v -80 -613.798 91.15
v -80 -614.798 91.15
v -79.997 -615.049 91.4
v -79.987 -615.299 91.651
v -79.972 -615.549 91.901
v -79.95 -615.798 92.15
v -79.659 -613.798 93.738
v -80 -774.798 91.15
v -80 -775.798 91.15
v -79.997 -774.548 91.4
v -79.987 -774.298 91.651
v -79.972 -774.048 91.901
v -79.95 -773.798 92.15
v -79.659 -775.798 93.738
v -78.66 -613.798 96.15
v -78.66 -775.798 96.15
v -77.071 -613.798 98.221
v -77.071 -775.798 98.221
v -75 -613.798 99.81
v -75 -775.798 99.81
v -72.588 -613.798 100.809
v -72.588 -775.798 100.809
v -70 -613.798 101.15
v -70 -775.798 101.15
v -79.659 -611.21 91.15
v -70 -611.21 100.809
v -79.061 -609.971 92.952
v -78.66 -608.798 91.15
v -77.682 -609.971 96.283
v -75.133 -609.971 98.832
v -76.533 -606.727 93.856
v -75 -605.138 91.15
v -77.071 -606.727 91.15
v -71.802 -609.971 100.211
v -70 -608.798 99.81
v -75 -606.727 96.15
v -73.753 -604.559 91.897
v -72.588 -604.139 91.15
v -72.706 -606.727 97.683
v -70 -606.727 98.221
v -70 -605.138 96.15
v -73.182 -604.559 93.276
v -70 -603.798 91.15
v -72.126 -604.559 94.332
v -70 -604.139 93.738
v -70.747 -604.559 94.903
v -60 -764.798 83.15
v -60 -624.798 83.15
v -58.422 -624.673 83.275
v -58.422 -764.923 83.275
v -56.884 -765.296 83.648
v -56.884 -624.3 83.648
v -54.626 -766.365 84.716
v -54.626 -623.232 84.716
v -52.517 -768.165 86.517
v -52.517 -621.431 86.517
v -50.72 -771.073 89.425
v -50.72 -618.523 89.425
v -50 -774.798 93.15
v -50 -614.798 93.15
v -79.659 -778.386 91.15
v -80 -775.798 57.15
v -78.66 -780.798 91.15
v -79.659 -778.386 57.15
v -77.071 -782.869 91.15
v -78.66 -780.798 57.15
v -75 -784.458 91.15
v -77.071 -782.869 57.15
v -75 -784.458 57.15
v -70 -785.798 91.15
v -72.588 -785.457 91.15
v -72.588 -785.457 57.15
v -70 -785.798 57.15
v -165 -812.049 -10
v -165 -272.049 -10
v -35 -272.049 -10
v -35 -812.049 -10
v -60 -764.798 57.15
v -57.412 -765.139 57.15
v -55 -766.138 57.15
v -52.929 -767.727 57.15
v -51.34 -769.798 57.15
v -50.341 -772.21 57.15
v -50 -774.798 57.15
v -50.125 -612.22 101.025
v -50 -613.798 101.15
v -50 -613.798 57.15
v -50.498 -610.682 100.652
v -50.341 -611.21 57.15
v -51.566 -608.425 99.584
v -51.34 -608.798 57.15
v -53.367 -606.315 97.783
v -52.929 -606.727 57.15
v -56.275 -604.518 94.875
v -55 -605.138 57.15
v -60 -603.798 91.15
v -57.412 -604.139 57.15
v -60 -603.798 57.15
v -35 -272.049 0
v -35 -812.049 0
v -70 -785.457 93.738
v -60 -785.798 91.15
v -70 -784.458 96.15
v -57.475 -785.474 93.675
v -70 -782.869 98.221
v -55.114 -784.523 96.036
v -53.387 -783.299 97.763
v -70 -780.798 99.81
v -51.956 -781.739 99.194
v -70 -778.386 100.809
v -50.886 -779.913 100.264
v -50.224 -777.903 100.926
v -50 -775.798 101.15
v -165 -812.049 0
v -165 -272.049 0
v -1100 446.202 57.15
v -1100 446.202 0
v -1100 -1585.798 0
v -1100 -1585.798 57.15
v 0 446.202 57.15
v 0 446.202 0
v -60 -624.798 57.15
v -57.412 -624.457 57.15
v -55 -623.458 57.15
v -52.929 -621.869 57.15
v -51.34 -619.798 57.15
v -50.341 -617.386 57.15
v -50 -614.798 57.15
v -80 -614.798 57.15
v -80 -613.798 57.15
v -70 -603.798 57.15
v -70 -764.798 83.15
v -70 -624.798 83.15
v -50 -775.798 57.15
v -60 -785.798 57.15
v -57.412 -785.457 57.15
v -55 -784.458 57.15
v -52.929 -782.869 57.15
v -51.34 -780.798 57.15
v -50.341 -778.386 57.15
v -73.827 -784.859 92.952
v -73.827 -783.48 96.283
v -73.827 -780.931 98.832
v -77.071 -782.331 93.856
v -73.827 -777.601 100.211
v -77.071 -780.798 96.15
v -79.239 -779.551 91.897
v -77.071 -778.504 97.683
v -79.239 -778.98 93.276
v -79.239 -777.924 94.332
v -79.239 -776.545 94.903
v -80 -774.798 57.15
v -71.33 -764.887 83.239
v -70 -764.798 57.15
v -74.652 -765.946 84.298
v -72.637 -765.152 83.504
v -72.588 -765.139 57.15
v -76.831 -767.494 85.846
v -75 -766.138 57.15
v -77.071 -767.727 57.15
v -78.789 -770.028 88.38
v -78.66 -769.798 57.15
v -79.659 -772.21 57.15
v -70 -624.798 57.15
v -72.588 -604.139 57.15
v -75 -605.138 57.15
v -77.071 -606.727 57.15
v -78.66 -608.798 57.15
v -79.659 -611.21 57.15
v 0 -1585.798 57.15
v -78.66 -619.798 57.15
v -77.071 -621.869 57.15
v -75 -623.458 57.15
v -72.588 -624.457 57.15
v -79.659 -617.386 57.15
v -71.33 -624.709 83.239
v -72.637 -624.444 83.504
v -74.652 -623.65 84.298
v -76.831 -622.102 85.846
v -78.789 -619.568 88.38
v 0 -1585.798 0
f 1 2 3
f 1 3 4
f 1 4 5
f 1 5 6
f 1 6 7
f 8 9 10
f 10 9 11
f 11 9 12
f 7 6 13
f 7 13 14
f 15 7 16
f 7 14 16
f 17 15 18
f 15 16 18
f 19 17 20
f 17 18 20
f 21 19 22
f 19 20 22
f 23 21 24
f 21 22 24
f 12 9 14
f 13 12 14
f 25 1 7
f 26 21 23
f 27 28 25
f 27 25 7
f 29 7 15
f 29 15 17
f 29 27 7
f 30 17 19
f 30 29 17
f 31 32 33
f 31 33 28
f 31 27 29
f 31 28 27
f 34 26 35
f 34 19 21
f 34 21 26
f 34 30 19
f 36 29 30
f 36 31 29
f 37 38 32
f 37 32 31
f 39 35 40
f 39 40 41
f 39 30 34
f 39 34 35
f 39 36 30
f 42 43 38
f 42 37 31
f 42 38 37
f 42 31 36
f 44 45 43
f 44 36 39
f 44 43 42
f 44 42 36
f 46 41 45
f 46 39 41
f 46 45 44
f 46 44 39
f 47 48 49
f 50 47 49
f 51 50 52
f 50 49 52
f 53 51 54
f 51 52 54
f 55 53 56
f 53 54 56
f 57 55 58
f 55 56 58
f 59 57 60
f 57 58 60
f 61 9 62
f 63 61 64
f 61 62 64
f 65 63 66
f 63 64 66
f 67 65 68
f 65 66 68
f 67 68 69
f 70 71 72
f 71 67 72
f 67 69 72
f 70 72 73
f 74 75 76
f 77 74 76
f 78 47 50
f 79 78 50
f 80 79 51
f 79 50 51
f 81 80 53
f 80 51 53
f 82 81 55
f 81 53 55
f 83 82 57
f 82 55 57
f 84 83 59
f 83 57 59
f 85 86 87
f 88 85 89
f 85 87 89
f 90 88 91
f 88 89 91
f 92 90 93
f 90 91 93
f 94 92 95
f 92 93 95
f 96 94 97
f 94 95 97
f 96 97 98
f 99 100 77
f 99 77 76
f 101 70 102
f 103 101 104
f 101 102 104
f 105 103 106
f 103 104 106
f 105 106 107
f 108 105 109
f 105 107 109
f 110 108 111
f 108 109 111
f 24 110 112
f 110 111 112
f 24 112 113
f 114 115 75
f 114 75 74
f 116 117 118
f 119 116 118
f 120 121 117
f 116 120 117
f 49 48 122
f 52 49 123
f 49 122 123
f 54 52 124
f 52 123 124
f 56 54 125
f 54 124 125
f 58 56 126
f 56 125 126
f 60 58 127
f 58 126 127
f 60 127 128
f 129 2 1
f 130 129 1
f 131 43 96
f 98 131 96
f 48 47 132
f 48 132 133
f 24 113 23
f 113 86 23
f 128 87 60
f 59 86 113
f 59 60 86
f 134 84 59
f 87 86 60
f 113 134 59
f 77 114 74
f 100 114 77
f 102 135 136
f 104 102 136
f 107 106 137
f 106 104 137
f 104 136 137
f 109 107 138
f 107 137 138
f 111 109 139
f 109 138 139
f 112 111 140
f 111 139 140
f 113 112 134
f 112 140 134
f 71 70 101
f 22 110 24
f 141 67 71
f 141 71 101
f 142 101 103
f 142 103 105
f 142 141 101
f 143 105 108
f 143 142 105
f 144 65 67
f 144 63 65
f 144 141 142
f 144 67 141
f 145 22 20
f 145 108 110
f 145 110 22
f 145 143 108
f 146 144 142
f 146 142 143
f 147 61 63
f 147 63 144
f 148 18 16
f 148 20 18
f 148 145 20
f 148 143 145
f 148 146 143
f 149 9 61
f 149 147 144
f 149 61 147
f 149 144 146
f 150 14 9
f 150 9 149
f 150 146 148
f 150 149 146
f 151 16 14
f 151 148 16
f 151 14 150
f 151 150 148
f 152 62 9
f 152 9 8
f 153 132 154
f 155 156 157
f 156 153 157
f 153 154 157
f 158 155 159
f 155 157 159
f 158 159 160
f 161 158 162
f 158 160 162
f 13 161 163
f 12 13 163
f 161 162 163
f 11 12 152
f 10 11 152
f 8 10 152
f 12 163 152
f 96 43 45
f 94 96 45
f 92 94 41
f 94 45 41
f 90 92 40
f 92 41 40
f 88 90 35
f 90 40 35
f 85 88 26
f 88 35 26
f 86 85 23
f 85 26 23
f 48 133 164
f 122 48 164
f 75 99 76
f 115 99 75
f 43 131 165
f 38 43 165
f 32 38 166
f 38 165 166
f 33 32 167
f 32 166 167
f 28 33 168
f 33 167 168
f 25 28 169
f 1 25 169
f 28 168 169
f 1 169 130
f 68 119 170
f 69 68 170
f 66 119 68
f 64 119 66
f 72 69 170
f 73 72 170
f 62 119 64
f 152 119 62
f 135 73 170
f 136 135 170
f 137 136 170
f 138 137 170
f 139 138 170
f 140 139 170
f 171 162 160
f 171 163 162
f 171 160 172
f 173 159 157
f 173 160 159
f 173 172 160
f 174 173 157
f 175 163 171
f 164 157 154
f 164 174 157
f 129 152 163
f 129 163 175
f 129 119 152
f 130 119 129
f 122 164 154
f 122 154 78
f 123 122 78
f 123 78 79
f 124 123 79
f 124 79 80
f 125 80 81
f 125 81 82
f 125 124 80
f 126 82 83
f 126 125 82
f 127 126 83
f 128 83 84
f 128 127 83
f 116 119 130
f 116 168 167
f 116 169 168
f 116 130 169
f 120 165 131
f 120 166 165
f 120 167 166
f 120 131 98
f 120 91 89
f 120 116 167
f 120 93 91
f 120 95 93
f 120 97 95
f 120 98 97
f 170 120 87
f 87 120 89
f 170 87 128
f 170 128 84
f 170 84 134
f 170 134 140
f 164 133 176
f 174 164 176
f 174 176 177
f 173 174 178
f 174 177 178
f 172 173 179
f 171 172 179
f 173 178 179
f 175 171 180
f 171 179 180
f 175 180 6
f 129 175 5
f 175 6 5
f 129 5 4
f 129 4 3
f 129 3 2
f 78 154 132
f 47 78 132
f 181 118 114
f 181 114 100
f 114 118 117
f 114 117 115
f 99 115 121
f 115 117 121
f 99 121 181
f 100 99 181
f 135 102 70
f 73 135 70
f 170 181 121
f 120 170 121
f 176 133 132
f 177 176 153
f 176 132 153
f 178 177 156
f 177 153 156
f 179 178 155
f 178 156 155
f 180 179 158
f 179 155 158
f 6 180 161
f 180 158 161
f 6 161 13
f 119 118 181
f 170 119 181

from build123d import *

# Parameters (mm, degrees)
BOSS_EXTRUDE2_DEPTH = 57.15
BOSS_EXTRUDE3_DEPTH = 44
CUT_EXTRUDE1_DEPTH  = 44
FILLET1_R           = 10
BOSS_EXTRUDE4_DEPTH = 10


with BuildPart() as part:
    # Sketch1 → Boss-Extrude2 (new body)
    with BuildSketch(Plane.XY):
        Polygon((0, 0), (0, 446.2018372120283), (-1100, 446.2018372120282), (-1100, -1585.7981627879717), (0, -1585.7981627879717), align=None)
    extrude(amount=BOSS_EXTRUDE2_DEPTH)

    # Sketch4 → Boss-Extrude3 (add)
    with BuildSketch(Plane.XY.offset(57.15)):
        Polygon((-79.99999999999993, -603.7981627879718), (-49.999999999999936, -603.7981627879718), (-49.999999999999915, -785.7981627879718), (-79.9999999999999, -785.7981627879718), align=None)
    extrude(amount=BOSS_EXTRUDE3_DEPTH)

    # Sketch5 → Cut-Extrude1 (cut)
    with BuildSketch(Plane.ZY.offset(80.00000000000003)):
        Polygon((83.14999999999999, -624.7981627879717), (57.150000000000006, -624.7981627879717), (57.15, -764.7981627879717), (83.15, -764.7981627879717), align=None)
    extrude(amount=-CUT_EXTRUDE1_DEPTH, mode=Mode.SUBTRACT)

    # Fillet1
    # the kernel refuses this fillet: 10 mm, written as the material it takes off along each edge
    with BuildSketch(Plane(origin=(-69.99999999999993, -613.7981627879718, 91.15), x_dir=(-1, -1.6e-16, 0), z_dir=(0, 1, 0))) as fillet1_piece_1_section:
        Polygon((0, 0), (FILLET1_R, 0), (FILLET1_R, FILLET1_R), (0, FILLET1_R), align=None)
    fillet1_piece_1 = extrude(amount=FILLET1_R, mode=Mode.PRIVATE)
    fillet1_piece_1 = fillet1_piece_1 - Plane(origin=(-69.99999999999993, -613.7981627879718, 91.15), x_dir=(0.7071067811865475, 0, -0.7071067811865475), z_dir=(0, 1, 0)) * Sphere(FILLET1_R, mode=Mode.PRIVATE)
    add(fillet1_piece_1, mode=Mode.SUBTRACT)
    with BuildSketch(Plane(origin=(-69.9999999999999, -775.7981627879718, 91.15), x_dir=(0, 0, 1), z_dir=(-1, -1.6e-16, 0))) as fillet1_piece_2_section:
        Polygon((0, 0), (FILLET1_R, 0), (FILLET1_R, -FILLET1_R), (0, -FILLET1_R), align=None)
    fillet1_piece_2 = extrude(amount=FILLET1_R, mode=Mode.PRIVATE)
    fillet1_piece_2 = fillet1_piece_2 - Plane(origin=(-69.9999999999999, -775.7981627879718, 91.15), x_dir=(0, 0.7071067811865475, -0.7071067811865475), z_dir=(-1, -1.6e-16, 0)) * Sphere(FILLET1_R, mode=Mode.PRIVATE)
    add(fillet1_piece_2, mode=Mode.SUBTRACT)
    with BuildSketch(Plane(origin=(-49.999999999999915, -785.7981627879718, 57.15), x_dir=(-1, 0, 0), z_dir=(0, 0, 1))) as fillet1_piece_3:
        with BuildLine():
            CenterArc((FILLET1_R, -FILLET1_R), FILLET1_R, 90, 90)
            Line((0, -FILLET1_R), (0, 0))
            Line((0, 0), (FILLET1_R, 0))
        make_face()
    extrude(amount=69, mode=Mode.SUBTRACT)
    with BuildSketch(Plane(origin=(-49.999999999999936, -603.7981627879718, 57.15), x_dir=(0, -1, 0), z_dir=(0, 0, 1))) as fillet1_piece_4:
        with BuildLine():
            CenterArc((FILLET1_R, -FILLET1_R), FILLET1_R, 90, 90)
            Line((0, -FILLET1_R), (0, 0))
            Line((0, 0), (FILLET1_R, 0))
        make_face()
    extrude(amount=69, mode=Mode.SUBTRACT)
    with BuildSketch(Plane(origin=(-79.99999999999993, -603.7981627879718, 57.15), x_dir=(1, 0, 0), z_dir=(0, 0, 1))) as fillet1_piece_5:
        with BuildLine():
            CenterArc((FILLET1_R, -FILLET1_R), FILLET1_R, 90, 90)
            Line((0, -FILLET1_R), (0, 0))
            Line((0, 0), (FILLET1_R, 0))
        make_face()
    extrude(amount=34.00000000000001, mode=Mode.SUBTRACT)
    with BuildSketch(Plane(origin=(-79.9999999999999, -785.7981627879718, 57.15), x_dir=(1, 0, 0), z_dir=(0, 0, 1))) as fillet1_piece_6:
        with BuildLine():
            CenterArc((FILLET1_R, FILLET1_R), FILLET1_R, 180, 90)
            Line((0, FILLET1_R), (0, 0))
            Line((0, 0), (FILLET1_R, 0))
        make_face()
    extrude(amount=34.00000000000001, mode=Mode.SUBTRACT)
    with BuildSketch(Plane(origin=(-69.99999999999993, -603.7981627879718, 101.15), x_dir=(0, 0, -1), z_dir=(1, 0, 0))) as fillet1_piece_7:
        with BuildLine():
            CenterArc((FILLET1_R, -FILLET1_R), FILLET1_R, 90, 90)
            Line((0, -FILLET1_R), (0, 0))
            Line((0, 0), (FILLET1_R, 0))
        make_face()
    extrude(amount=44.99999999999999, mode=Mode.SUBTRACT)
    with BuildSketch(Plane(origin=(-79.9999999999999, -775.7981627879718, 101.15), x_dir=(0, 0, -1), z_dir=(-1.6e-16, 1, 0))) as fillet1_piece_8:
        with BuildLine():
            CenterArc((FILLET1_R, -FILLET1_R), FILLET1_R, 90, 90)
            Line((0, -FILLET1_R), (0, 0))
            Line((0, 0), (FILLET1_R, 0))
        make_face()
    extrude(amount=162, mode=Mode.SUBTRACT)
    with BuildSketch(Plane(origin=(-24.999999999999915, -785.7981627879718, 101.15), x_dir=(0, 0, -1), z_dir=(-1, 0, 0))) as fillet1_piece_9:
        with BuildLine():
            CenterArc((FILLET1_R, -FILLET1_R), FILLET1_R, 90, 90)
            Line((0, -FILLET1_R), (0, 0))
            Line((0, 0), (FILLET1_R, 0))
        make_face()
    extrude(amount=44.999999999999986, mode=Mode.SUBTRACT)
    with BuildSketch(Plane(origin=(-79.99999999999991, -764.7981627879717, 57.15000000000002), x_dir=(1.42e-15, -1, 0), z_dir=(0, 0, 1))) as fillet1_piece_10:
        with BuildLine():
            CenterArc((FILLET1_R, FILLET1_R), FILLET1_R, 180, 89.99999999999989)
            Line((1.421e-14, FILLET1_R), (0, 0))
            Line((0, 0), (FILLET1_R, 0))
        make_face()
    extrude(amount=25.999999999999986, mode=Mode.SUBTRACT)
    with BuildSketch(Plane(origin=(-79.99999999999993, -624.7981627879717, 83.14999999999999), x_dir=(0, 1, 0), z_dir=(0, 0, -1))) as fillet1_piece_11:
        with BuildLine():
            CenterArc((FILLET1_R, FILLET1_R), FILLET1_R, 180, 90)
            Line((0, FILLET1_R), (0, 0))
            Line((0, 0), (FILLET1_R, 0))
        make_face()
    extrude(amount=25.999999999999986, mode=Mode.SUBTRACT)
    with BuildSketch(Plane(origin=(-79.99999999999991, -764.7981627879717, 83.15), x_dir=(1.42e-15, 1e-16, 1), z_dir=(-1.5e-16, 1, -1e-16))) as fillet1_piece_12:
        with BuildLine():
            CenterArc((FILLET1_R, FILLET1_R), FILLET1_R, 180, 89.99999999999989)
            Line((1.421e-14, FILLET1_R), (0, 0))
            Line((0, 0), (FILLET1_R, 0))
        make_face()
    extrude(amount=140, mode=Mode.SUBTRACT)
    with BuildSketch(Plane(origin=(-49.999999999999915, -764.7981627879717, 83.15), x_dir=(0, -1, 0), z_dir=(0, 0, -1))) as fillet1_piece_13:
        with BuildLine():
            CenterArc((FILLET1_R, FILLET1_R), FILLET1_R, 180, 90)
            Line((0, FILLET1_R), (0, 0))
            Line((0, 0), (FILLET1_R, 0))
        make_face()
    extrude(amount=26, mode=Mode.SUBTRACT)
    with BuildSketch(Plane(origin=(-49.999999999999936, -624.7981627879717, 57.150000000000006), x_dir=(0, 1, 0), z_dir=(0, 0, 1))) as fillet1_piece_14:
        with BuildLine():
            CenterArc((FILLET1_R, FILLET1_R), FILLET1_R, 180.00000000000003, 90)
            Line((0, FILLET1_R), (0, 0))
            Line((0, 0), (FILLET1_R, 0))
        make_face()
    extrude(amount=25.999999999999986, mode=Mode.SUBTRACT)
    with BuildSketch(Plane(origin=(-49.999999999999936, -624.7981627879717, 83.15), x_dir=(0, 1e-16, 1), z_dir=(1.2e-16, -1, 1e-16))) as fillet1_piece_15:
        with BuildLine():
            CenterArc((FILLET1_R, FILLET1_R), FILLET1_R, 180, 90)
            Line((0, FILLET1_R), (0, 0))
            Line((0, 0), (FILLET1_R, 0))
        make_face()
    extrude(amount=140, mode=Mode.SUBTRACT)
    with BuildSketch(Plane(origin=(-79.99999999999991, -764.7981627879717, 57.15000000000002), x_dir=(1.42e-15, -1, 0), z_dir=(0, 0, 1))) as fillet1_piece_16a_section:
        with BuildLine():
            CenterArc((FILLET1_R, FILLET1_R), FILLET1_R, 180, 89.99999999999989)
            Line((1.421e-14, FILLET1_R), (0, 0))
            Line((0, 0), (FILLET1_R, 0))
        make_face()
    fillet1_piece_16a = extrude(amount=50.999999999999986, mode=Mode.PRIVATE)
    fillet1_piece_16a = split(fillet1_piece_16a, bisect_by=Plane(origin=(-77.7360488573316, -767.0621139306398, 83.15), z_dir=(0, 1e-16, 1)), keep=Keep.TOP, mode=Mode.PRIVATE)
    with BuildSketch(Plane(origin=(-79.9999999999999, -789.7981627879717, 83.15), x_dir=(0, 1e-16, 1), z_dir=(-1.5e-16, 1, -1e-16))) as fillet1_piece_16b_section:
        with BuildLine():
            CenterArc((FILLET1_R, FILLET1_R), FILLET1_R, 180, 90)
            Line((0, FILLET1_R), (0, 0))
            Line((0, 0), (FILLET1_R, 0))
        make_face()
    fillet1_piece_16b = extrude(amount=165, mode=Mode.PRIVATE)
    fillet1_piece_16b = split(fillet1_piece_16b, bisect_by=Plane(origin=(-77.73604885733165, -764.7981627879717, 85.41395114266827), z_dir=(1.5e-16, -1, 0)), keep=Keep.TOP, mode=Mode.PRIVATE)
    fillet1_piece_16 = fillet1_piece_16a & fillet1_piece_16b
    add(fillet1_piece_16, mode=Mode.SUBTRACT)
    with BuildSketch(Plane(origin=(-79.99999999999991, -764.7981627879717, 83.15), x_dir=(1.42e-15, 1e-16, 1), z_dir=(-1.5e-16, 1, -1e-16))) as fillet1_piece_17a_section:
        with BuildLine():
            CenterArc((FILLET1_R, FILLET1_R), FILLET1_R, 180, 89.99999999999989)
            Line((1.421e-14, FILLET1_R), (0, 0))
            Line((0, 0), (FILLET1_R, 0))
        make_face()
    fillet1_piece_17a = extrude(amount=165, mode=Mode.PRIVATE)
    fillet1_piece_17a = split(fillet1_piece_17a, bisect_by=Plane(origin=(-77.73604885733167, -624.7981627879717, 85.41395114266825), z_dir=(-1.5e-16, 1, 0)), keep=Keep.TOP, mode=Mode.PRIVATE)
    with BuildSketch(Plane(origin=(-79.99999999999993, -624.7981627879717, 108.14999999999998), x_dir=(0, 1, 0), z_dir=(0, 0, -1))) as fillet1_piece_17b_section:
        with BuildLine():
            CenterArc((FILLET1_R, FILLET1_R), FILLET1_R, 180, 90)
            Line((0, FILLET1_R), (0, 0))
            Line((0, 0), (FILLET1_R, 0))
        make_face()
    fillet1_piece_17b = extrude(amount=50.999999999999986, mode=Mode.PRIVATE)
    fillet1_piece_17b = split(fillet1_piece_17b, bisect_by=Plane(origin=(-77.73604885733164, -622.5342116453035, 83.14999999999999), z_dir=(0, 1e-16, 1)), keep=Keep.TOP, mode=Mode.PRIVATE)
    fillet1_piece_17 = fillet1_piece_17a & fillet1_piece_17b
    add(fillet1_piece_17, mode=Mode.SUBTRACT)
    with BuildSketch(Plane(origin=(-49.999999999999936, -624.7981627879717, 83.15), x_dir=(0, 1e-16, 1), z_dir=(1.2e-16, -1, 1e-16))) as fillet1_piece_18a_section:
        with BuildLine():
            CenterArc((FILLET1_R, FILLET1_R), FILLET1_R, 180, 90)
            Line((0, FILLET1_R), (0, 0))
            Line((0, 0), (FILLET1_R, 0))
        make_face()
    fillet1_piece_18a = extrude(amount=165, mode=Mode.PRIVATE)
    fillet1_piece_18a = split(fillet1_piece_18a, bisect_by=Plane(origin=(-52.26395114266817, -764.7981627879717, 85.41395114266827), z_dir=(1.5e-16, -1, 0)), keep=Keep.TOP, mode=Mode.PRIVATE)
    with BuildSketch(Plane(origin=(-49.999999999999915, -764.7981627879717, 108.15), x_dir=(0, -1, 0), z_dir=(0, 0, -1))) as fillet1_piece_18b_section:
        with BuildLine():
            CenterArc((FILLET1_R, FILLET1_R), FILLET1_R, 180, 90)
            Line((0, FILLET1_R), (0, 0))
            Line((0, 0), (FILLET1_R, 0))
        make_face()
    fillet1_piece_18b = extrude(amount=51, mode=Mode.PRIVATE)
    fillet1_piece_18b = split(fillet1_piece_18b, bisect_by=Plane(origin=(-52.2639511426682, -767.0621139306397, 83.15), z_dir=(0, 1e-16, 1)), keep=Keep.TOP, mode=Mode.PRIVATE)
    fillet1_piece_18 = fillet1_piece_18a & fillet1_piece_18b
    add(fillet1_piece_18, mode=Mode.SUBTRACT)
    with BuildSketch(Plane(origin=(-49.999999999999936, -624.7981627879717, 57.150000000000006), x_dir=(0, 1, 0), z_dir=(0, 0, 1))) as fillet1_piece_19a_section:
        with BuildLine():
            CenterArc((FILLET1_R, FILLET1_R), FILLET1_R, 180.00000000000003, 90)
            Line((0, FILLET1_R), (0, 0))
            Line((0, 0), (FILLET1_R, 0))
        make_face()
    fillet1_piece_19a = extrude(amount=50.999999999999986, mode=Mode.PRIVATE)
    fillet1_piece_19a = split(fillet1_piece_19a, bisect_by=Plane(origin=(-52.26395114266823, -622.5342116453035, 83.14999999999999), z_dir=(0, 1e-16, 1)), keep=Keep.TOP, mode=Mode.PRIVATE)
    with BuildSketch(Plane(origin=(-49.999999999999936, -599.7981627879717, 83.14999999999999), x_dir=(0, 1e-16, 1), z_dir=(1.2e-16, -1, 1e-16))) as fillet1_piece_19b_section:
        with BuildLine():
            CenterArc((FILLET1_R, FILLET1_R), FILLET1_R, 179.99999999999997, 90)
            Line((0, FILLET1_R), (0, 0))
            Line((0, 0), (FILLET1_R, 0))
        make_face()
    fillet1_piece_19b = extrude(amount=165, mode=Mode.PRIVATE)
    fillet1_piece_19b = split(fillet1_piece_19b, bisect_by=Plane(origin=(-52.26395114266818, -624.7981627879717, 85.41395114266824), z_dir=(-1.5e-16, 1, 0)), keep=Keep.TOP, mode=Mode.PRIVATE)
    fillet1_piece_19 = fillet1_piece_19a & fillet1_piece_19b
    add(fillet1_piece_19, mode=Mode.SUBTRACT)

    # Sketch6 → Boss-Extrude4 (add)
    with BuildSketch(Plane(origin=(0, 0, 0), x_dir=(-1, 0, 0), z_dir=(0, 0, -1))):
        Polygon((34.99999999999994, -272.04870051020725), (164.99999999999986, -272.04870051020725), (165, -812.0487005102073), (35, -812.0487005102073), align=None)
    extrude(amount=BOSS_EXTRUDE4_DEPTH)


solid = part.part
